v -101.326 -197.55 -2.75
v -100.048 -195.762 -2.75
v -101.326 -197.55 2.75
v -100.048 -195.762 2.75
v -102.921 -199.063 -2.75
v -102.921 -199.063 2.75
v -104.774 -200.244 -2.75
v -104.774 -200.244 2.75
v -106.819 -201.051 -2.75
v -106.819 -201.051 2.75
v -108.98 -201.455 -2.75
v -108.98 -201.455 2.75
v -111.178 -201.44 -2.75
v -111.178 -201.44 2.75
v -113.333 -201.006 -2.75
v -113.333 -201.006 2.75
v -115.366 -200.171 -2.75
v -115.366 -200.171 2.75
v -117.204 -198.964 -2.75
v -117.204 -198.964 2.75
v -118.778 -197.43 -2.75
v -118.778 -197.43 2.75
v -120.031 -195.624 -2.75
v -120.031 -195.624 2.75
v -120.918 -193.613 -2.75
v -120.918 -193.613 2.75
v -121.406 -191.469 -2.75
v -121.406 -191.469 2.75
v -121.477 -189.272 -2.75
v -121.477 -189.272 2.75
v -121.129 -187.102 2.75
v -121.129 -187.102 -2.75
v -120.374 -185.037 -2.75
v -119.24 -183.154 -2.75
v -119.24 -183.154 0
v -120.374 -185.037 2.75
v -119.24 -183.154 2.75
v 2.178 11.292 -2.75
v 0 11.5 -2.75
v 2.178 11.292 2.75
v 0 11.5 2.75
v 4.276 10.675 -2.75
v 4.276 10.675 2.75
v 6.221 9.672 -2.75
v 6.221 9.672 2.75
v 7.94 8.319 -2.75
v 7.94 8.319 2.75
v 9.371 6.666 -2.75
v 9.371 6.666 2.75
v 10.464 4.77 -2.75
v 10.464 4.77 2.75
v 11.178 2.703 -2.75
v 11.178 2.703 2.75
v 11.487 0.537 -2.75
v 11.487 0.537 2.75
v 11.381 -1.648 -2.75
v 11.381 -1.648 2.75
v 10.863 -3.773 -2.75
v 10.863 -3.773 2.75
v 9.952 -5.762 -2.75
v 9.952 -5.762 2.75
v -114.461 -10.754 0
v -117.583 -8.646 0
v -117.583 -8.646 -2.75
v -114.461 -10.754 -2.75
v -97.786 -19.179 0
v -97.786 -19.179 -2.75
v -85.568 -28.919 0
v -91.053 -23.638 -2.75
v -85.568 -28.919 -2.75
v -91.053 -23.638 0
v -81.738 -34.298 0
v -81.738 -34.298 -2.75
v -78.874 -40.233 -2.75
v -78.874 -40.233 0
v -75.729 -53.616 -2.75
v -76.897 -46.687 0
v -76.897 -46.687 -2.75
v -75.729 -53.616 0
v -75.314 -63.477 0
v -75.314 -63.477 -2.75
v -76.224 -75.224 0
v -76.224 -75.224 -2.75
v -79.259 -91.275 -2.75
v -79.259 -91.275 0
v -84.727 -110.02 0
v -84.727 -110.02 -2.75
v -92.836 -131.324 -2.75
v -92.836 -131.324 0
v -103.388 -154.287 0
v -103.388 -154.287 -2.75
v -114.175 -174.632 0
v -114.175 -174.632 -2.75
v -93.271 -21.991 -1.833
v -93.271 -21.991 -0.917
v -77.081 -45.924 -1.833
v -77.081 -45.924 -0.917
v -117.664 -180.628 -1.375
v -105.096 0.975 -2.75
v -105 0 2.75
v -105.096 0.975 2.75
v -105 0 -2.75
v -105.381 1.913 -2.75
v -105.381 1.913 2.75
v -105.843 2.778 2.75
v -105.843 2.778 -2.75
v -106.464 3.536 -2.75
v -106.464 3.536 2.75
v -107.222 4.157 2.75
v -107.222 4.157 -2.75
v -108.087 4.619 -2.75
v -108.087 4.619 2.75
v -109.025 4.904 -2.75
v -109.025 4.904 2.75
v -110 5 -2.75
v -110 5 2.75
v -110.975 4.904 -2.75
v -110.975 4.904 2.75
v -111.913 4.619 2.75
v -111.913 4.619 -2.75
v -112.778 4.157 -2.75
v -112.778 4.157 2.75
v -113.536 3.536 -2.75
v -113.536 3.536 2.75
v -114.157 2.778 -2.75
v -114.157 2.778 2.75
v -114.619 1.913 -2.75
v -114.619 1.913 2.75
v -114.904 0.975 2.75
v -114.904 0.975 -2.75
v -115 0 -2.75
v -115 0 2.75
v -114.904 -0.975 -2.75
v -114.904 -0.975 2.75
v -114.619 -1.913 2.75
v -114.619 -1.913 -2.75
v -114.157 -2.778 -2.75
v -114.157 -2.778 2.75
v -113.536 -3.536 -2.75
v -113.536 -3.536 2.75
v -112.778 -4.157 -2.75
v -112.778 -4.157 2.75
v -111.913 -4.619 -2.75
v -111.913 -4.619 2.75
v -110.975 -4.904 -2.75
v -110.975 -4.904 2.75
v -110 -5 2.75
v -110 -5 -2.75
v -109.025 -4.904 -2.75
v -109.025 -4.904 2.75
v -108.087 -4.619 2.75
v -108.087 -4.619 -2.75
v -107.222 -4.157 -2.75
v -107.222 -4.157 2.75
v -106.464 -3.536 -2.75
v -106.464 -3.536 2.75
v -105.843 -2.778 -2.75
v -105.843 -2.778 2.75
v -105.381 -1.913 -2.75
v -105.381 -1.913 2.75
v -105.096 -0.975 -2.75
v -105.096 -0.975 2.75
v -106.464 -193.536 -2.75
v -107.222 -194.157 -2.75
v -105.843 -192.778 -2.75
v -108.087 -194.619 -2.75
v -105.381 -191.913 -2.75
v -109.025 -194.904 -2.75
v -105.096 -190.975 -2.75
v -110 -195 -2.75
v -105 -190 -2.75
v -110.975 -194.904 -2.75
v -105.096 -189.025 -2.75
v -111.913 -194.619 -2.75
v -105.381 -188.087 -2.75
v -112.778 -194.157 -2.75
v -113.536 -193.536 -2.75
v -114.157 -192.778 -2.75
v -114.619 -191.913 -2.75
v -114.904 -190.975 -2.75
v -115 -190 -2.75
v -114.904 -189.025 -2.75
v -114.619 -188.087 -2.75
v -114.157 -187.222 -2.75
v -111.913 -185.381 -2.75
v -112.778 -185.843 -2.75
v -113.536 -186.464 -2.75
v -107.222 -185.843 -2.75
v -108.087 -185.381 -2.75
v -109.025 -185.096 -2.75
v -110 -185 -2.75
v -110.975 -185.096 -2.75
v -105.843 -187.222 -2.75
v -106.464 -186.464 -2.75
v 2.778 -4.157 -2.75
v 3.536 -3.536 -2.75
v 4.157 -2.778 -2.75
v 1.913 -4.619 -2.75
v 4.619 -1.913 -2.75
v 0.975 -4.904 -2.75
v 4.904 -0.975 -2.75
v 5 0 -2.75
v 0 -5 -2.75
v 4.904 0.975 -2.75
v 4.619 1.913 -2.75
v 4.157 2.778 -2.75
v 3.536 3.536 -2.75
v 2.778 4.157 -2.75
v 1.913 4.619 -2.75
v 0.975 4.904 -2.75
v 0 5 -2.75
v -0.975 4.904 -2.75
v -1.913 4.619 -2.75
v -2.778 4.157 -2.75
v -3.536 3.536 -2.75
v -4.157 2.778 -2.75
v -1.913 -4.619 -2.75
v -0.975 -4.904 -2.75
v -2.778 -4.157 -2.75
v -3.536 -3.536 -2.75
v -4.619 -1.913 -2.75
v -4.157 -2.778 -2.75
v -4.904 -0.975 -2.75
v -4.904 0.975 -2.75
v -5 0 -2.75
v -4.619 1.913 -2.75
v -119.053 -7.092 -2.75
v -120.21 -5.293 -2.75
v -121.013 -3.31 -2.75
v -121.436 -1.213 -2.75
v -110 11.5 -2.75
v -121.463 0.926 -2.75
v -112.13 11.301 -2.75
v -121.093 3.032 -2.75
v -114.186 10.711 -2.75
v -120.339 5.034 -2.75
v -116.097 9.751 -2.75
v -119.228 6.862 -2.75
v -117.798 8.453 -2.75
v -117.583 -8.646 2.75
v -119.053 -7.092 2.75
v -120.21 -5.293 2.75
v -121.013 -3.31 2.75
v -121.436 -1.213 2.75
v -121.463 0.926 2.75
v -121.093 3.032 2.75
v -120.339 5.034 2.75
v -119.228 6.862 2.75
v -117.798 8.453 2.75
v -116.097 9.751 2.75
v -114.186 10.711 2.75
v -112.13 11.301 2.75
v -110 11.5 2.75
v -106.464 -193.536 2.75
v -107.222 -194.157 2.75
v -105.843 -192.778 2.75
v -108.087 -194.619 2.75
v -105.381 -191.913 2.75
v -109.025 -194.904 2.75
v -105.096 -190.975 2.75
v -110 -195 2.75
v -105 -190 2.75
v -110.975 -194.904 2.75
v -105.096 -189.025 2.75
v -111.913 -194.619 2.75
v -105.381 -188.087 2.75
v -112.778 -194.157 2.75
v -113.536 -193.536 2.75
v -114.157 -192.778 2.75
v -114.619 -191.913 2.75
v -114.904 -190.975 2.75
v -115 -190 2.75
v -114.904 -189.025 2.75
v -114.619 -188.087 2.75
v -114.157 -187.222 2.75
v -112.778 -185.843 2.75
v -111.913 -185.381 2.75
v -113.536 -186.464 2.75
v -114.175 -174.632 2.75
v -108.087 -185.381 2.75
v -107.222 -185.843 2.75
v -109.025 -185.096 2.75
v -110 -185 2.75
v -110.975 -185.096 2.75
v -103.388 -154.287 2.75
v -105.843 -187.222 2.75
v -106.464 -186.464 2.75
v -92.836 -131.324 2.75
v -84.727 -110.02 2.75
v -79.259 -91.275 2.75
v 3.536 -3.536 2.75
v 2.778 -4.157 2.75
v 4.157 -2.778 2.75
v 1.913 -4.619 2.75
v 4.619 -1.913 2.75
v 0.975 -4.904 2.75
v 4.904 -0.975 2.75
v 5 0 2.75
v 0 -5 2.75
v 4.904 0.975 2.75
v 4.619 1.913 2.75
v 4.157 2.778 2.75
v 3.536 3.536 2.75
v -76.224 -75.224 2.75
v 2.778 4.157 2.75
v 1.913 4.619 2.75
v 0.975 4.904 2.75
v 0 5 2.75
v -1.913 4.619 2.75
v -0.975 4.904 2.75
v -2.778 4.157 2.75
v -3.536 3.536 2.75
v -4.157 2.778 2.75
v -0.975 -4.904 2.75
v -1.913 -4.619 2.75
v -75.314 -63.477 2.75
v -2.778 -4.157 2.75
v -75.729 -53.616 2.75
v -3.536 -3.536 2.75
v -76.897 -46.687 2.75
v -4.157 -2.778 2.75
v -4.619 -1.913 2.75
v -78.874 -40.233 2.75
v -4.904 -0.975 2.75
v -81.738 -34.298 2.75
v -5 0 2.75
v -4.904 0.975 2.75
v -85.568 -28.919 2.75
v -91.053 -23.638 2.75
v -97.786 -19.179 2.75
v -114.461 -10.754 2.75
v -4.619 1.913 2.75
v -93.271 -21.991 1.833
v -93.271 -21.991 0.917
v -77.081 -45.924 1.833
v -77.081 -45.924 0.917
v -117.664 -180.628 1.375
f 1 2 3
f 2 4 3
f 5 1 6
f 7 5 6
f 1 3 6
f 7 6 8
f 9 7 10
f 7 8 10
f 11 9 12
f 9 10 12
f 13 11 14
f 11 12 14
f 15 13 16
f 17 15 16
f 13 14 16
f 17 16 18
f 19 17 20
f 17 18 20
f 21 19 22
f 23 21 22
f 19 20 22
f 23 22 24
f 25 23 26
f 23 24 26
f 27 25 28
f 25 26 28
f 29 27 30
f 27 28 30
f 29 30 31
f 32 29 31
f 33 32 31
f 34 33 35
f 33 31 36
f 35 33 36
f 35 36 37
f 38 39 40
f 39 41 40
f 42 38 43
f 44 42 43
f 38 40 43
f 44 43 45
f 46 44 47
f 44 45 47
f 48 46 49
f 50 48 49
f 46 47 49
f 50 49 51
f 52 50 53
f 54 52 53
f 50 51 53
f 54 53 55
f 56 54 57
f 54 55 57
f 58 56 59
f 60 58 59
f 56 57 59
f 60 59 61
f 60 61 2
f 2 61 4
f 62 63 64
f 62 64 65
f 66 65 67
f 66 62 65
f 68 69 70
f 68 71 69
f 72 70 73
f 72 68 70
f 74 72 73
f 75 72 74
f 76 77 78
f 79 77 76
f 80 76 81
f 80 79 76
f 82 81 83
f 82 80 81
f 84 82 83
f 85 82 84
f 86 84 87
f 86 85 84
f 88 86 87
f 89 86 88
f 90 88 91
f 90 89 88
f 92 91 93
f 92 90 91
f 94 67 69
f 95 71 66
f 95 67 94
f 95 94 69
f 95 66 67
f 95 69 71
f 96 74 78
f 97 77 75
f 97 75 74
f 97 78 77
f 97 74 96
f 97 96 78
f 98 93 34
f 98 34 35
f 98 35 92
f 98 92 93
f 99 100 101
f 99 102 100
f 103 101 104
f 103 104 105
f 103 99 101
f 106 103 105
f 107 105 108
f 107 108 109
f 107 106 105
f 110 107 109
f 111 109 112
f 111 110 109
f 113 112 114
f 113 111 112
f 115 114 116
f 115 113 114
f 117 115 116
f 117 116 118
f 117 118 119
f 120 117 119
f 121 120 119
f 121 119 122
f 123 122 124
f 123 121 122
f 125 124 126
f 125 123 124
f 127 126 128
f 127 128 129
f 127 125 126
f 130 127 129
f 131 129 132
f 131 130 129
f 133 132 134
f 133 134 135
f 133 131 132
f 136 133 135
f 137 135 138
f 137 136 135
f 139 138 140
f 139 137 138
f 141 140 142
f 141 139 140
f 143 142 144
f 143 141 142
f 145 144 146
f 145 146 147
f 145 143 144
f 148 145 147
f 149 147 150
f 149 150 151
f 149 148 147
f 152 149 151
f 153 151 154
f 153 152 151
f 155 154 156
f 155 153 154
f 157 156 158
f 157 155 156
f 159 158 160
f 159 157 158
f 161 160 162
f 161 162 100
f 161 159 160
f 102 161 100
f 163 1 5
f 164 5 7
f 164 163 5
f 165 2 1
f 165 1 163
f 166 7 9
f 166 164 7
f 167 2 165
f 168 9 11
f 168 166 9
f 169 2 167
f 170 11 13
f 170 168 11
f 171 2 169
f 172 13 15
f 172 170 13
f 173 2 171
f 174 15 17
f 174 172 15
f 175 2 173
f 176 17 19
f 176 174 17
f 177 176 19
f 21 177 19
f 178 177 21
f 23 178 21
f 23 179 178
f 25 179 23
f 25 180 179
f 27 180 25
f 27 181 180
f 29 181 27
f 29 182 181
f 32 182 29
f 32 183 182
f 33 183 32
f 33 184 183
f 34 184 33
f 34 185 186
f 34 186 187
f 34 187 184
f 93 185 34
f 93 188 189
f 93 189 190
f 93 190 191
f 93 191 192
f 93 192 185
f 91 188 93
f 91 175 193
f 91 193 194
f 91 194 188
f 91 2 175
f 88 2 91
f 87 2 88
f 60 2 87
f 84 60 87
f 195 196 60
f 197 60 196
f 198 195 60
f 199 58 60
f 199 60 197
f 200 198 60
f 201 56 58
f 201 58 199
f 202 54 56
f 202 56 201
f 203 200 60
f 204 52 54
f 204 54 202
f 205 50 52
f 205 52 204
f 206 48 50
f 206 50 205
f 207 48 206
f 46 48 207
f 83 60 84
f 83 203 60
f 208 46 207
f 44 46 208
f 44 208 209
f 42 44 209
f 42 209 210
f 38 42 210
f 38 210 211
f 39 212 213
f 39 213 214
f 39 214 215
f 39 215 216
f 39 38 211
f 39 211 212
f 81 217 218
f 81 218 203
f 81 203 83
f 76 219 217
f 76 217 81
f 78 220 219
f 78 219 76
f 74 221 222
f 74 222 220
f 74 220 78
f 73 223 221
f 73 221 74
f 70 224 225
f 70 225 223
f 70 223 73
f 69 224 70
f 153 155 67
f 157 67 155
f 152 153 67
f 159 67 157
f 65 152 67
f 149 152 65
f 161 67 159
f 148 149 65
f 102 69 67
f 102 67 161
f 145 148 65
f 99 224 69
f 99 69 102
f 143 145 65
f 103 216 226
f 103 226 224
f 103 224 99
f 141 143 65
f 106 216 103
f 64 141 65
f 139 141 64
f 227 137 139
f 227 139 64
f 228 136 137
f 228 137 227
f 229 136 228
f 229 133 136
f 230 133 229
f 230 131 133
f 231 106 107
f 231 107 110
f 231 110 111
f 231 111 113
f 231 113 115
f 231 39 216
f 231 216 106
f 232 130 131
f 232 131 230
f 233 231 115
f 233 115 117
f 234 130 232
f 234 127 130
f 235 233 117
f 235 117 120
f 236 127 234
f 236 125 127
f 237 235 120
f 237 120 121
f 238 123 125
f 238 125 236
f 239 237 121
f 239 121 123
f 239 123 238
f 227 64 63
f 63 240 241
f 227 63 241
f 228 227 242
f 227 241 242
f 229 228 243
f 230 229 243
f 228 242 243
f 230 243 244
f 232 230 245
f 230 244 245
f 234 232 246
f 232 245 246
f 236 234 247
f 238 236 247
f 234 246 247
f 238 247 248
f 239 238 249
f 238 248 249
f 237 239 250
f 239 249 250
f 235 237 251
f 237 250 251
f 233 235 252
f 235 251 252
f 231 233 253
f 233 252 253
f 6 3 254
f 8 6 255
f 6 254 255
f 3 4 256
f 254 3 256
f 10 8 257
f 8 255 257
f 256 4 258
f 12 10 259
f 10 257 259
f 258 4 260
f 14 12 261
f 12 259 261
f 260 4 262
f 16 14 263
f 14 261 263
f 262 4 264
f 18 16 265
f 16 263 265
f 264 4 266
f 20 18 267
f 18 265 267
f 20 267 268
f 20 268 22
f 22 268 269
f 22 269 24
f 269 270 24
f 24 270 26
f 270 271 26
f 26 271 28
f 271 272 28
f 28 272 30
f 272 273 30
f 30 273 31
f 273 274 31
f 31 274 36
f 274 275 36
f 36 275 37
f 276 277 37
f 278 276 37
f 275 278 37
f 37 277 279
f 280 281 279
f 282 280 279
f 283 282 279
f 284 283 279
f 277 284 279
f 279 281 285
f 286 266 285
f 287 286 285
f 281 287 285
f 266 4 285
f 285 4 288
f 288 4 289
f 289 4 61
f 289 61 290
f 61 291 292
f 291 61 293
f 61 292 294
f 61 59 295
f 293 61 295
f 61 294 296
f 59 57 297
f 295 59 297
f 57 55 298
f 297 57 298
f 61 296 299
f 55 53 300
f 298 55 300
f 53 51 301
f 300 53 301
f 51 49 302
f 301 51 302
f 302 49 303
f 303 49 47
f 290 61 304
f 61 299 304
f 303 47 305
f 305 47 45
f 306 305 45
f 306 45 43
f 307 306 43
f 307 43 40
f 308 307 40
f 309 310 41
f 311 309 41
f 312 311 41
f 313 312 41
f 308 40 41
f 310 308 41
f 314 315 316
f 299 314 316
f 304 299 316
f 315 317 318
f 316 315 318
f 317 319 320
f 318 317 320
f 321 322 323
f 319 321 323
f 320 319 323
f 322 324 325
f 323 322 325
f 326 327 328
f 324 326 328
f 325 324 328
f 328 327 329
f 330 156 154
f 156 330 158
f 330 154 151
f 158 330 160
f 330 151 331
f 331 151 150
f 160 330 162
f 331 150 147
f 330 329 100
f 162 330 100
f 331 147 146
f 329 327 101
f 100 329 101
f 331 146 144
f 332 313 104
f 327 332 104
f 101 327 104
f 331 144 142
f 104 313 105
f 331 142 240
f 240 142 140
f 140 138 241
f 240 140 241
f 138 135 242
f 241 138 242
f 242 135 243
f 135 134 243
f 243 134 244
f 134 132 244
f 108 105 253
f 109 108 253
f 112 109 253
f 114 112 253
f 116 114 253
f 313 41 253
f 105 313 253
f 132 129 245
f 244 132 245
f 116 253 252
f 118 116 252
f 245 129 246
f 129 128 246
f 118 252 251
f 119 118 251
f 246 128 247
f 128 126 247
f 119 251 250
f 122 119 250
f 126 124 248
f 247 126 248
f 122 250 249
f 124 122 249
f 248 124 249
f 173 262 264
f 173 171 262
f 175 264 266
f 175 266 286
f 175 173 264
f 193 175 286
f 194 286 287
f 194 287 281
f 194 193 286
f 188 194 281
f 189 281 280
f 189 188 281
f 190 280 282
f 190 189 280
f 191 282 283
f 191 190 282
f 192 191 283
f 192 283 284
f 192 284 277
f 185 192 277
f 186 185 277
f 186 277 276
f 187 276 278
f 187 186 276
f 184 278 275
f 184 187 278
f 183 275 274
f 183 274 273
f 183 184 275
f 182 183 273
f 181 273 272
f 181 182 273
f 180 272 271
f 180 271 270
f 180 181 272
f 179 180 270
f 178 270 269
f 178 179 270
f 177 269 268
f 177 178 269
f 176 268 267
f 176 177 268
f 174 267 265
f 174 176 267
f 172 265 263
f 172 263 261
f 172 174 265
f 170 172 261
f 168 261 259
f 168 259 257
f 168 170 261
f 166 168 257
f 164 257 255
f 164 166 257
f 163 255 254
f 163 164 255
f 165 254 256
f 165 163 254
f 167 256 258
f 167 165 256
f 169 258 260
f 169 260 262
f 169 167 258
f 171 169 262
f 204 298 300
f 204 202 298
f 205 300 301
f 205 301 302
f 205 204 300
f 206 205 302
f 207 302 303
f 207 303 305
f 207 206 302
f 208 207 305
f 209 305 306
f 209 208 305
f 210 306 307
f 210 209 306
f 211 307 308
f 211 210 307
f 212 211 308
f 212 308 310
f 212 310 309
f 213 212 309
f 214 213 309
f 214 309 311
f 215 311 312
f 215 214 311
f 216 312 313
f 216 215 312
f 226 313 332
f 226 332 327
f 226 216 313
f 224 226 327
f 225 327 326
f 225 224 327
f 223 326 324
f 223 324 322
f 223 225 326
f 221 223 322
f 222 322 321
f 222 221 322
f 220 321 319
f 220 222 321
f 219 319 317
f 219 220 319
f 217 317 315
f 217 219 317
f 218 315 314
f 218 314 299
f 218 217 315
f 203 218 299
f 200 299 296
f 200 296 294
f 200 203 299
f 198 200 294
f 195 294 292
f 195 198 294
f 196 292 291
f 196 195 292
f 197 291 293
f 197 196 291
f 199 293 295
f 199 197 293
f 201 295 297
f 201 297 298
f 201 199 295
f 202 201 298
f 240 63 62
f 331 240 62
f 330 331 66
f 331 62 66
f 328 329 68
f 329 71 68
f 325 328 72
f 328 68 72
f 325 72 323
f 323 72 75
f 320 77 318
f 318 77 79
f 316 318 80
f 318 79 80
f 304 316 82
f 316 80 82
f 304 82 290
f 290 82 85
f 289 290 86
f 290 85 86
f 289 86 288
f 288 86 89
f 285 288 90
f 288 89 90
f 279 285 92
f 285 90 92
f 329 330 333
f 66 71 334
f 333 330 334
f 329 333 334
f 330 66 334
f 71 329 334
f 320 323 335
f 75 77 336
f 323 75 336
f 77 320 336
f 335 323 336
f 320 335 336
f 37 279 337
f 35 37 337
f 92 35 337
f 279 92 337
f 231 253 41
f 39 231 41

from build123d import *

# Parameters (mm, degrees)
SKETCH1_R           = 5
BOSS_EXTRUDE1_DEPTH = 2.75


with BuildPart() as part:
    # Sketch1 → Boss-Extrude1 (new body, symmetric)
    with BuildSketch(Plane.XY):
        with BuildLine():
            Line((-110, 11.5), (0, 11.5))
            ThreePointArc((0, 11.5), (9.962731723, 5.744038354), (9.952402283, -5.761917111))
            Line((9.952402283, -5.761917111), (-100.047597717, -195.761917111))
            ThreePointArc((-100.047597717, -195.761917111), (-116.313869125, -199.611714554), (-119.240449643, -183.154264802))
            add(Edge.make_bspline(
                [(-117.582652102, -8.646004111), (-113.500583089, -12.226028917), (-89.343136838, -20.249723308), (-54.529955021, -76.69947908), (-117.517833386, -180.829058186), (-119.240449643, -183.154264802)],
                knots=[0, 0, 0, 0, 0.138535768, 0.282875599, 1, 1, 1, 1], degree=3))
            ThreePointArc((-117.582652102, -8.646004111), (-120.762877108, 4.050984616), (-110, 11.5))
        make_face()
        Circle(SKETCH1_R, mode=Mode.SUBTRACT)
        with Locations((-110, -190)):
            Circle(SKETCH1_R, mode=Mode.SUBTRACT)
        with Locations((-110, 0)):
            Circle(SKETCH1_R, mode=Mode.SUBTRACT)
    extrude(amount=BOSS_EXTRUDE1_DEPTH, both=True)


solid = part.part
